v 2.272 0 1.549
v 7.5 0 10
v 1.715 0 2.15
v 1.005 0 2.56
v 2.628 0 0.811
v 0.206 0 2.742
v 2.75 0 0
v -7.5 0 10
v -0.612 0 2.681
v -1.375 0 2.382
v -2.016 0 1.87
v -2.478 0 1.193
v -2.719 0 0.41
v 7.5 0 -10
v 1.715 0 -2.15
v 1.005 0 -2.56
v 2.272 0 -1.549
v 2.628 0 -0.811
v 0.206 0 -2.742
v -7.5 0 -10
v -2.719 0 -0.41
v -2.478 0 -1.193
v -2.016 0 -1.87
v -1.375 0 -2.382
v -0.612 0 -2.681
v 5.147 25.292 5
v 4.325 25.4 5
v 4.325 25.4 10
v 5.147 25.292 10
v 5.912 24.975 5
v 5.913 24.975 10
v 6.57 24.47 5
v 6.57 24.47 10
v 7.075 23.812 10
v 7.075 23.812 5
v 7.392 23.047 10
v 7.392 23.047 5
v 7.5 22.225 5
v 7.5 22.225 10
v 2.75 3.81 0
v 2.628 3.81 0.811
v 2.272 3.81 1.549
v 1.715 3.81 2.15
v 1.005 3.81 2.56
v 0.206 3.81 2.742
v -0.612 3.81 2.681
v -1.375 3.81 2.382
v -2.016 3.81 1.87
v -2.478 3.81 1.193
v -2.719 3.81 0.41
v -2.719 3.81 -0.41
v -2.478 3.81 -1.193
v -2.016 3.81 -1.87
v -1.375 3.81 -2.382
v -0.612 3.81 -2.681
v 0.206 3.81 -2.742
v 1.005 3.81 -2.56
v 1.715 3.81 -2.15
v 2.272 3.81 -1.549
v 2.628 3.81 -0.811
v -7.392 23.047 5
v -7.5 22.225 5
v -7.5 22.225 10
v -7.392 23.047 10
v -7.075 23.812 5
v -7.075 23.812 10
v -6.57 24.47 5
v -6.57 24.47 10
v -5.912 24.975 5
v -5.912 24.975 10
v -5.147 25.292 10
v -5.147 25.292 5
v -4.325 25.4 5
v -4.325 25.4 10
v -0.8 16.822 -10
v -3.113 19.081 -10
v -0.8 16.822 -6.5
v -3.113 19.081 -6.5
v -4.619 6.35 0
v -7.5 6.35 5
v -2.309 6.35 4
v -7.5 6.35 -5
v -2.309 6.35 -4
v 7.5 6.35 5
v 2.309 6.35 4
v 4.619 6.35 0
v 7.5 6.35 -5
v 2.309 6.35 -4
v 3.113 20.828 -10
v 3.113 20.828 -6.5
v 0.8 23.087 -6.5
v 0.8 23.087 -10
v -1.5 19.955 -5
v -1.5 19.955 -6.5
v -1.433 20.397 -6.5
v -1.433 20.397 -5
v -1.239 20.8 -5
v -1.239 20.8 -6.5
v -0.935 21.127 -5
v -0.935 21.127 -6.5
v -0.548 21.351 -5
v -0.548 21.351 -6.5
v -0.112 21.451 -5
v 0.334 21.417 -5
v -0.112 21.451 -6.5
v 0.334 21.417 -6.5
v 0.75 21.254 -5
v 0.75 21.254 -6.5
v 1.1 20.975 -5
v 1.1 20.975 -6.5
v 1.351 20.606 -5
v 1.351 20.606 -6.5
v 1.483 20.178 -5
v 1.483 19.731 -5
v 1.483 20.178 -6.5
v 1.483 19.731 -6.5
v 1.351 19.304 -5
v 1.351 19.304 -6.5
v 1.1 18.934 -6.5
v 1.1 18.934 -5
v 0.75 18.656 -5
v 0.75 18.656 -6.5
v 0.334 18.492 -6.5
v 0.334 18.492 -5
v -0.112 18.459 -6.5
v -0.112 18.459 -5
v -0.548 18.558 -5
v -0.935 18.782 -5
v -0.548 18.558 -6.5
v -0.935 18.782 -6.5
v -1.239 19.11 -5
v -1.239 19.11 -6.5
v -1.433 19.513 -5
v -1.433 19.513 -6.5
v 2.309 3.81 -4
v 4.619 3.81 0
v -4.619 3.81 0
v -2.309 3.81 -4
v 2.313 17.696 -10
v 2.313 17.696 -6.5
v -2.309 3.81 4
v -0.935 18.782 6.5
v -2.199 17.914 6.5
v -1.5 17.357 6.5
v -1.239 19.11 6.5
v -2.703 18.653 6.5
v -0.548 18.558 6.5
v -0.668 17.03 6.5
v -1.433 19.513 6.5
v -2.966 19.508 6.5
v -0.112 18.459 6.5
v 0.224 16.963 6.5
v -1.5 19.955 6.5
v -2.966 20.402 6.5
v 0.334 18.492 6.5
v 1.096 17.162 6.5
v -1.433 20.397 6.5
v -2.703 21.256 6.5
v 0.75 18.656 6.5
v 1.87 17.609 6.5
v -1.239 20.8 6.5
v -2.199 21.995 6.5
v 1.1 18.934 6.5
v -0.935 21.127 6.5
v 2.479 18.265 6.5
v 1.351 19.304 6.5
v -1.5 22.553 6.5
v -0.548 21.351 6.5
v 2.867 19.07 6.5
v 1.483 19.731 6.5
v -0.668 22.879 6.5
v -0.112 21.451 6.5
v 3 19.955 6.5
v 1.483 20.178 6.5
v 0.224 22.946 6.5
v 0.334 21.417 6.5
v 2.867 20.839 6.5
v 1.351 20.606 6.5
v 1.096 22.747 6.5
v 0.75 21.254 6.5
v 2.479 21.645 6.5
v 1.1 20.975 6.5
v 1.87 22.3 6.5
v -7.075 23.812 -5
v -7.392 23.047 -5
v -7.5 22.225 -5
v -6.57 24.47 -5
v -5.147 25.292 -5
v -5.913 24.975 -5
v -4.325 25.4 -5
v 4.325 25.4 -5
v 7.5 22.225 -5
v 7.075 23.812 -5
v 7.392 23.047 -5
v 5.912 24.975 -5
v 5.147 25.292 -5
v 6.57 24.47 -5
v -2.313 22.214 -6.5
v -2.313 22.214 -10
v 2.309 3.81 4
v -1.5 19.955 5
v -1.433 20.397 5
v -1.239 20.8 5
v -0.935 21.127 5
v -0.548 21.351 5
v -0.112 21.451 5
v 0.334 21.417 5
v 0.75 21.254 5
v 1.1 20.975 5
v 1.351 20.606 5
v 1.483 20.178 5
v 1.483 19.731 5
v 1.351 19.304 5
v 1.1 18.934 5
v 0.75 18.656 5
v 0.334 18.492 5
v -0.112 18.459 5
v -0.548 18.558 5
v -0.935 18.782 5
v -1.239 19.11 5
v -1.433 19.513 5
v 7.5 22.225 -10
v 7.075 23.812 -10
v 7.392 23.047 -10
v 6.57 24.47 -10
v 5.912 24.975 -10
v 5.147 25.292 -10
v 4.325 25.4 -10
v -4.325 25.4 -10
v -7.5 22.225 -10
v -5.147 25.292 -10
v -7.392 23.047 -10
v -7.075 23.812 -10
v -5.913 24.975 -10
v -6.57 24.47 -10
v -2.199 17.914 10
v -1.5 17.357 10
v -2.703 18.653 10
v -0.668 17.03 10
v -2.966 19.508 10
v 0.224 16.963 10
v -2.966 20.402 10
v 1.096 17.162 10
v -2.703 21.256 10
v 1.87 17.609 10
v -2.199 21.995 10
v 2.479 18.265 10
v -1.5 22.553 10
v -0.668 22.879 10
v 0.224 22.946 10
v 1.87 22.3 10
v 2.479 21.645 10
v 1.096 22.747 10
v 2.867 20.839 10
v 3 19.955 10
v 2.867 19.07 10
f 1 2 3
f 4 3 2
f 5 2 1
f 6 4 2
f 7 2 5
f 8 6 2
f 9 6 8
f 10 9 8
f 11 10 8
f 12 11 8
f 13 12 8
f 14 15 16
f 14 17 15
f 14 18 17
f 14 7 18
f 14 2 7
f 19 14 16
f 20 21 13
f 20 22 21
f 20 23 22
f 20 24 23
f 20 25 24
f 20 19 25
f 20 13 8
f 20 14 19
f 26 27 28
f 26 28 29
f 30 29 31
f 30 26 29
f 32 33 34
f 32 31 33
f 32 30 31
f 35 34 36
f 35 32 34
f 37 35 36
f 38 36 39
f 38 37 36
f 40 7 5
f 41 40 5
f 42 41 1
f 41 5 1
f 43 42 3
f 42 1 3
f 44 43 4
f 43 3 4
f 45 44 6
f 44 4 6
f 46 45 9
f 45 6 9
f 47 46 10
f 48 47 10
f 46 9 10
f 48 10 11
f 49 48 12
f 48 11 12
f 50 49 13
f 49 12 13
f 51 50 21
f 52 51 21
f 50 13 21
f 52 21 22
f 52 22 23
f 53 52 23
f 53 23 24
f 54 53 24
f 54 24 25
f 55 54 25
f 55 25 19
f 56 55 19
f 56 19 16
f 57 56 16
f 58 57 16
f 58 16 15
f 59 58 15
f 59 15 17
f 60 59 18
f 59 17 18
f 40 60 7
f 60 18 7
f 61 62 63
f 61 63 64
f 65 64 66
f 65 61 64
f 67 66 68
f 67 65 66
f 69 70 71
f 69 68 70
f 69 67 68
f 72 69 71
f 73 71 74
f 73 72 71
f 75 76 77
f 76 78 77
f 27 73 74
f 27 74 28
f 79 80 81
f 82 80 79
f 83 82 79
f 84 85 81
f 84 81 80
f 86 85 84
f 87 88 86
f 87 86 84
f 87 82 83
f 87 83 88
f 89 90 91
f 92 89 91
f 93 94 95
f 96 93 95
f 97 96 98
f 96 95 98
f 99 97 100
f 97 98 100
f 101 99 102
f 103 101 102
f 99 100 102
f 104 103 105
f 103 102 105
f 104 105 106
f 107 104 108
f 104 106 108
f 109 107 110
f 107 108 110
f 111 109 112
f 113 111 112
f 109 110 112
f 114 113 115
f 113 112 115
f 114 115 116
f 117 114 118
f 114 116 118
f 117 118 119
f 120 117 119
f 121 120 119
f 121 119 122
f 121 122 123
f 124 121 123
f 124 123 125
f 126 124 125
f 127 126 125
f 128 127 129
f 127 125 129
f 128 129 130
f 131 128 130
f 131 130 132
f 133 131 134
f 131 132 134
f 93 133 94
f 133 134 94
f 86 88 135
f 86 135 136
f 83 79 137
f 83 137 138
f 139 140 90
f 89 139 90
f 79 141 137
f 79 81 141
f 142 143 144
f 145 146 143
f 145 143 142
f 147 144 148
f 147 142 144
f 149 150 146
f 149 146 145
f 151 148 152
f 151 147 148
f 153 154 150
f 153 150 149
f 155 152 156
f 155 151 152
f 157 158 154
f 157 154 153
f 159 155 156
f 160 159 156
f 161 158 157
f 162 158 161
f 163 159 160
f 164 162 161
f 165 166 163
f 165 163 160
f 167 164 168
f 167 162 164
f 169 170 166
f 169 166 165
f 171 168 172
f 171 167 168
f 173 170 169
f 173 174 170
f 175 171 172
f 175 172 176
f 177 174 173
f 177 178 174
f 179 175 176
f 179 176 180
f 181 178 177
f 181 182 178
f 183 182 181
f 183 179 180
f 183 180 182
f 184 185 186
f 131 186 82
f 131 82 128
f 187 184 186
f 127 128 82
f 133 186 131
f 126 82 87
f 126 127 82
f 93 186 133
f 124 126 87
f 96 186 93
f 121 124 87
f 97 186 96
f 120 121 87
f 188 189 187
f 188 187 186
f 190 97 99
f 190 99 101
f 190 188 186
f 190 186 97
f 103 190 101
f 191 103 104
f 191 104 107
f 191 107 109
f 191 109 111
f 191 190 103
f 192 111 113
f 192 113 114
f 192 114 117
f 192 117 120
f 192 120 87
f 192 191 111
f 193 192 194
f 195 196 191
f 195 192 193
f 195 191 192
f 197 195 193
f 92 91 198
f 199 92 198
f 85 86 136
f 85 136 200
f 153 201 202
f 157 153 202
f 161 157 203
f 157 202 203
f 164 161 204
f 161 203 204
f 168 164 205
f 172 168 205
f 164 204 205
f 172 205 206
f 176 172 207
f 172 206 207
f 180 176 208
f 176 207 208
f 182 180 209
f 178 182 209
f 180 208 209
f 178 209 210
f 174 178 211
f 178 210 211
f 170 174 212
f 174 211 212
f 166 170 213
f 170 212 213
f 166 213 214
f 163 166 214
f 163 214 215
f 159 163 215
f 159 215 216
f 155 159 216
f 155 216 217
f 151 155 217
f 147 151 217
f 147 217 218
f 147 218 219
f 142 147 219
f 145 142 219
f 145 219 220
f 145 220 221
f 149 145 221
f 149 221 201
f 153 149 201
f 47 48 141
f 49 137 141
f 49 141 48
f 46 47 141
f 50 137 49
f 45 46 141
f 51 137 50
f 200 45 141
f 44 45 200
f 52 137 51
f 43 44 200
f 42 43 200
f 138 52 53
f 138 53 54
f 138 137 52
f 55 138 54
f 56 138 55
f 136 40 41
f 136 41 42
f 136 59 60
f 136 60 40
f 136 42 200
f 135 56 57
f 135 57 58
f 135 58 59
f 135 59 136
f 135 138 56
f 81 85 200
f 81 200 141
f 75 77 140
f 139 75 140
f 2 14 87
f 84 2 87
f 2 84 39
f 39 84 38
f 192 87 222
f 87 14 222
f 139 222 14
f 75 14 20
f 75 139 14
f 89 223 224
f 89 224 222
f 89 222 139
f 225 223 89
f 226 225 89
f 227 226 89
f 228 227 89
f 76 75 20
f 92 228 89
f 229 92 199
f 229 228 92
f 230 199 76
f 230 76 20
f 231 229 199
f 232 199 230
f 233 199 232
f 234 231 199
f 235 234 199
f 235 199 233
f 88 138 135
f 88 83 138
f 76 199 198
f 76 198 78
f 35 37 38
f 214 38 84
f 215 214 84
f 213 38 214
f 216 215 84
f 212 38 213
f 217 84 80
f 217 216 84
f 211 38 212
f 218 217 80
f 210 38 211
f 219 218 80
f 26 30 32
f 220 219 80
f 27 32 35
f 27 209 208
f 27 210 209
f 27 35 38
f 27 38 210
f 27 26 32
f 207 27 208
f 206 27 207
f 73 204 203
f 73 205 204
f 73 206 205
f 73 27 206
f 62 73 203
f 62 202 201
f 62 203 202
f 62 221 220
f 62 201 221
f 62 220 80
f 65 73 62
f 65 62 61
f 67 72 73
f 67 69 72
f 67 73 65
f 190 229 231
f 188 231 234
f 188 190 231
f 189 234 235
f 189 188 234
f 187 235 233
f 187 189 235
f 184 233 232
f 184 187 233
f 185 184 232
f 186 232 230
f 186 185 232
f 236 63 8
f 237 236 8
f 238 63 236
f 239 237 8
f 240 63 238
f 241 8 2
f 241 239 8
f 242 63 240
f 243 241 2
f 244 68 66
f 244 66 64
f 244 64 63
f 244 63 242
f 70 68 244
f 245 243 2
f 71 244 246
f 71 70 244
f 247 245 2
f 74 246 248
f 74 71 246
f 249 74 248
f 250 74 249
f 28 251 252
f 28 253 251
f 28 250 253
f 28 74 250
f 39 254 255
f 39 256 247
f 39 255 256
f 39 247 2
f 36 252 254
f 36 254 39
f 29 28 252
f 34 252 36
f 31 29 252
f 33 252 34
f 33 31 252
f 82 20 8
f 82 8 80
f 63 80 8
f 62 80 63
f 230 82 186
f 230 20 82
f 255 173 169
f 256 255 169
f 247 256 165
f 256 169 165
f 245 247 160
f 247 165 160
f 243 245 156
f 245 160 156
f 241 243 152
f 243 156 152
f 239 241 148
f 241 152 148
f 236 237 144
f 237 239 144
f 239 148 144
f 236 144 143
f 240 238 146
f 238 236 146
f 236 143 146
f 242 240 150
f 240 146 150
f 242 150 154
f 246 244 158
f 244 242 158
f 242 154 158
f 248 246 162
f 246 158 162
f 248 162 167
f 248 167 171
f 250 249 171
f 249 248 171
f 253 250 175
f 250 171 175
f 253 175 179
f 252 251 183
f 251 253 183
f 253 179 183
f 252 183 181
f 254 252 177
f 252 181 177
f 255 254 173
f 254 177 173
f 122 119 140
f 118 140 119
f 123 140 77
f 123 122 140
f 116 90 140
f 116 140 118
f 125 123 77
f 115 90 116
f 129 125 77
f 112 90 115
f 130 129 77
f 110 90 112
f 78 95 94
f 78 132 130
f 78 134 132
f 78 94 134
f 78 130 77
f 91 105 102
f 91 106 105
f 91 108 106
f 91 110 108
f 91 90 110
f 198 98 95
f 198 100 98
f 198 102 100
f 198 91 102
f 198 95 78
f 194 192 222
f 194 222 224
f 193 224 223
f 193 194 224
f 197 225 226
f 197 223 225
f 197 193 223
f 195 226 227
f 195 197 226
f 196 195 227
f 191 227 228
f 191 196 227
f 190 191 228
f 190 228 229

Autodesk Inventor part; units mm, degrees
ref_plane "YZ Plane" through (0, 0, 0) normal (1, 0, 0) x (0, 1, 0)
ref_plane "XZ Plane" through (0, 0, 0) normal (0, 1, 0) x (-1, 0, 0)
ref_plane "XY Plane" through (0, 0, 0) normal (0, 0, 1) x (1, 0, 0)
sketch "Sketch1" plane through (0, 0, 0) normal (0, 1, 0) x (-1, 0, 0)
  line L0 (-7.5, 9) -> (7.5, 9)
  line L1 (7.5, 9) -> (7.5, -9)
  line L2 (7.5, -9) -> (-7.5, -9)
  line L3 (-7.5, -9) -> (-7.5, 9)
  line L4 (-7.5, 9) -> (7.5, -9) construction
  line L5 (7.5, 9) -> (-7.5, -9) construction
  point P0 (0, 0)
  dimension "d0" = 18
  dimension "d1" = 15
extrude "Extrusion1" add sketch "Sketch1" along normal blind 25.4
sketch "Sketch2" plane through (0, 25.4, 0) normal (0, 1, 0) x (1, 0, 0)
  line L0 (12.4357, -5) -> (-12.4357, -5)
  line L1 (-12.4357, -5) -> (-12.4357, 5)
  line L2 (-12.4357, 5) -> (12.4357, 5)
  line L3 (12.4357, 5) -> (12.4357, -5)
  line L4 (12.4357, -5) -> (-12.4357, 5) construction
  line L5 (-12.4357, -5) -> (12.4357, 5) construction
  line L6 (7.5, 9) -> (-7.5, 9) projected
  point P0 (0, 0)
  dimension "d5" = 10
extrude "Extrusion2" cut sketch "Sketch2" against normal blind 19.05
sketch "Sketch3" plane through (7.5, 0, -9) normal (0, 0, -1) x (-1, 0, 0)
  line L0 (0, 25.4) -> (15, 25.4) projected
  line L1 (7.5, 25.4) -> (7.5, 0)
  circle A0 centre (7.5, 19.9547) radius 1.5
  dimension "d8" = 3
extrude "Extrusion3" cut sketch "Sketch3" against normal through all
fillet "Fillet1" radius 3.175 4 edges at (-7.5, 25.4, -7) (7.5, 25.4, -7) (-7.5, 25.4, 7) (7.5, 25.4, 7)
sketch "Sketch4" plane through (0, 0, 0) normal (0, -1, 0) x (1, 0, 0)
  circle A0 centre (0, 0) radius 2.75
  dimension "d12" = 5.5
extrude "Extrusion4" cut sketch "Sketch4" against normal blind 19.05
sketch "Sketch5" plane through (0, 6.35, 0) normal (0, 1, 0) x (1, 0, 0)
  line L0 (-4.6188, 0) -> (-2.3094, 4)
  line L1 (-2.3094, 4) -> (2.3094, 4)
  line L2 (2.3094, 4) -> (4.6188, 0)
  line L3 (4.6188, 0) -> (2.3094, -4)
  line L4 (2.3094, -4) -> (-2.3094, -4)
  line L5 (-2.3094, -4) -> (-4.6188, 0)
  point P0 (0, 0)
  point P1 (0, 0)
  dimension "d15" = 8
extrude "Extrusion5" cut sketch "Sketch5" against normal blind 2.54
sketch "Sketch6" plane through (-7.5, 0, 9) normal (0, 0, 1) x (1, 0, 0)
  circle A0 centre (7.5, 19.9547) radius 1.5 projected
  circle A1 centre (7.5, 19.9547) radius 3
  point P0 (7.5, 0)
  dimension "d18" = 6
extrude "Extrusion6" cut sketch "Sketch6" against normal blind 2.5
sketch "Sketch7" plane through (7.5, 0, -9) normal (0, 0, -1) x (-1, 0, 0)
  circle A0 centre (7.5, 19.9547) radius 1.5 projected
  line L0 (10.6129, 19.0812) -> (8.3, 16.822)
  line L1 (8.3, 16.822) -> (5.1871, 17.6955)
  line L2 (5.1871, 17.6955) -> (4.3871, 20.8282)
  line L3 (4.3871, 20.8282) -> (6.7, 23.0873)
  line L4 (6.7, 23.0873) -> (9.8129, 22.2138)
  line L5 (9.8129, 22.2138) -> (10.6129, 19.0812)
  point P0 (7.5, 0)
  dimension "d21" = 5.6
extrude "Extrusion7" cut sketch "Sketch7" against normal blind 2.5
sketch "Sketch8" plane through (7.5, 0, -9) normal (0, 0, -1) x (-1, 0, 0)
  line L0 (9.8129, 22.2138) -> (10.6129, 19.0812) projected
  line L1 (10.6129, 19.0812) -> (8.3, 16.822) projected
  line L2 (8.3, 16.822) -> (5.1871, 17.6955) projected
  line L3 (5.1871, 17.6955) -> (4.3871, 20.8282) projected
  line L4 (4.3871, 20.8282) -> (6.7, 23.0873) projected
  line L5 (6.7, 23.0873) -> (9.8129, 22.2138) projected
  arc A0 (3.175, 25.4) -> (0, 22.225) centre (3.175, 22.225) ccw projected
  line L6 (0, 0) -> (0, 22.225) projected
  line L7 (15, 0) -> (0, 0) projected
  line L8 (15, 0) -> (15, 22.225) projected
  arc A1 (15, 22.225) -> (11.825, 25.4) centre (11.825, 22.225) ccw projected
  line L9 (3.175, 25.4) -> (11.825, 25.4) projected
  point P0 (7.5, 0)
extrude "Extrusion8" add sketch "Sketch8" along normal blind 1
sketch "Sketch9" plane through (-7.5, 0, 9) normal (0, 0, 1) x (1, 0, 0)
  circle A0 centre (7.5, 19.9547) radius 3 projected
  arc A1 (15, 22.225) -> (11.825, 25.4) centre (11.825, 22.225) ccw projected
  line L0 (3.175, 25.4) -> (11.825, 25.4) projected
  arc A2 (3.175, 25.4) -> (0, 22.225) centre (3.175, 22.225) ccw projected
  line L1 (0, 0) -> (0, 22.225) projected
  line L2 (15, 0) -> (0, 0) projected
  line L3 (15, 0) -> (15, 22.225) projected
  point P0 (7.5, 0)
extrude "Extrusion9" add sketch "Sketch9" along normal blind 1
properties part number "xTension"
